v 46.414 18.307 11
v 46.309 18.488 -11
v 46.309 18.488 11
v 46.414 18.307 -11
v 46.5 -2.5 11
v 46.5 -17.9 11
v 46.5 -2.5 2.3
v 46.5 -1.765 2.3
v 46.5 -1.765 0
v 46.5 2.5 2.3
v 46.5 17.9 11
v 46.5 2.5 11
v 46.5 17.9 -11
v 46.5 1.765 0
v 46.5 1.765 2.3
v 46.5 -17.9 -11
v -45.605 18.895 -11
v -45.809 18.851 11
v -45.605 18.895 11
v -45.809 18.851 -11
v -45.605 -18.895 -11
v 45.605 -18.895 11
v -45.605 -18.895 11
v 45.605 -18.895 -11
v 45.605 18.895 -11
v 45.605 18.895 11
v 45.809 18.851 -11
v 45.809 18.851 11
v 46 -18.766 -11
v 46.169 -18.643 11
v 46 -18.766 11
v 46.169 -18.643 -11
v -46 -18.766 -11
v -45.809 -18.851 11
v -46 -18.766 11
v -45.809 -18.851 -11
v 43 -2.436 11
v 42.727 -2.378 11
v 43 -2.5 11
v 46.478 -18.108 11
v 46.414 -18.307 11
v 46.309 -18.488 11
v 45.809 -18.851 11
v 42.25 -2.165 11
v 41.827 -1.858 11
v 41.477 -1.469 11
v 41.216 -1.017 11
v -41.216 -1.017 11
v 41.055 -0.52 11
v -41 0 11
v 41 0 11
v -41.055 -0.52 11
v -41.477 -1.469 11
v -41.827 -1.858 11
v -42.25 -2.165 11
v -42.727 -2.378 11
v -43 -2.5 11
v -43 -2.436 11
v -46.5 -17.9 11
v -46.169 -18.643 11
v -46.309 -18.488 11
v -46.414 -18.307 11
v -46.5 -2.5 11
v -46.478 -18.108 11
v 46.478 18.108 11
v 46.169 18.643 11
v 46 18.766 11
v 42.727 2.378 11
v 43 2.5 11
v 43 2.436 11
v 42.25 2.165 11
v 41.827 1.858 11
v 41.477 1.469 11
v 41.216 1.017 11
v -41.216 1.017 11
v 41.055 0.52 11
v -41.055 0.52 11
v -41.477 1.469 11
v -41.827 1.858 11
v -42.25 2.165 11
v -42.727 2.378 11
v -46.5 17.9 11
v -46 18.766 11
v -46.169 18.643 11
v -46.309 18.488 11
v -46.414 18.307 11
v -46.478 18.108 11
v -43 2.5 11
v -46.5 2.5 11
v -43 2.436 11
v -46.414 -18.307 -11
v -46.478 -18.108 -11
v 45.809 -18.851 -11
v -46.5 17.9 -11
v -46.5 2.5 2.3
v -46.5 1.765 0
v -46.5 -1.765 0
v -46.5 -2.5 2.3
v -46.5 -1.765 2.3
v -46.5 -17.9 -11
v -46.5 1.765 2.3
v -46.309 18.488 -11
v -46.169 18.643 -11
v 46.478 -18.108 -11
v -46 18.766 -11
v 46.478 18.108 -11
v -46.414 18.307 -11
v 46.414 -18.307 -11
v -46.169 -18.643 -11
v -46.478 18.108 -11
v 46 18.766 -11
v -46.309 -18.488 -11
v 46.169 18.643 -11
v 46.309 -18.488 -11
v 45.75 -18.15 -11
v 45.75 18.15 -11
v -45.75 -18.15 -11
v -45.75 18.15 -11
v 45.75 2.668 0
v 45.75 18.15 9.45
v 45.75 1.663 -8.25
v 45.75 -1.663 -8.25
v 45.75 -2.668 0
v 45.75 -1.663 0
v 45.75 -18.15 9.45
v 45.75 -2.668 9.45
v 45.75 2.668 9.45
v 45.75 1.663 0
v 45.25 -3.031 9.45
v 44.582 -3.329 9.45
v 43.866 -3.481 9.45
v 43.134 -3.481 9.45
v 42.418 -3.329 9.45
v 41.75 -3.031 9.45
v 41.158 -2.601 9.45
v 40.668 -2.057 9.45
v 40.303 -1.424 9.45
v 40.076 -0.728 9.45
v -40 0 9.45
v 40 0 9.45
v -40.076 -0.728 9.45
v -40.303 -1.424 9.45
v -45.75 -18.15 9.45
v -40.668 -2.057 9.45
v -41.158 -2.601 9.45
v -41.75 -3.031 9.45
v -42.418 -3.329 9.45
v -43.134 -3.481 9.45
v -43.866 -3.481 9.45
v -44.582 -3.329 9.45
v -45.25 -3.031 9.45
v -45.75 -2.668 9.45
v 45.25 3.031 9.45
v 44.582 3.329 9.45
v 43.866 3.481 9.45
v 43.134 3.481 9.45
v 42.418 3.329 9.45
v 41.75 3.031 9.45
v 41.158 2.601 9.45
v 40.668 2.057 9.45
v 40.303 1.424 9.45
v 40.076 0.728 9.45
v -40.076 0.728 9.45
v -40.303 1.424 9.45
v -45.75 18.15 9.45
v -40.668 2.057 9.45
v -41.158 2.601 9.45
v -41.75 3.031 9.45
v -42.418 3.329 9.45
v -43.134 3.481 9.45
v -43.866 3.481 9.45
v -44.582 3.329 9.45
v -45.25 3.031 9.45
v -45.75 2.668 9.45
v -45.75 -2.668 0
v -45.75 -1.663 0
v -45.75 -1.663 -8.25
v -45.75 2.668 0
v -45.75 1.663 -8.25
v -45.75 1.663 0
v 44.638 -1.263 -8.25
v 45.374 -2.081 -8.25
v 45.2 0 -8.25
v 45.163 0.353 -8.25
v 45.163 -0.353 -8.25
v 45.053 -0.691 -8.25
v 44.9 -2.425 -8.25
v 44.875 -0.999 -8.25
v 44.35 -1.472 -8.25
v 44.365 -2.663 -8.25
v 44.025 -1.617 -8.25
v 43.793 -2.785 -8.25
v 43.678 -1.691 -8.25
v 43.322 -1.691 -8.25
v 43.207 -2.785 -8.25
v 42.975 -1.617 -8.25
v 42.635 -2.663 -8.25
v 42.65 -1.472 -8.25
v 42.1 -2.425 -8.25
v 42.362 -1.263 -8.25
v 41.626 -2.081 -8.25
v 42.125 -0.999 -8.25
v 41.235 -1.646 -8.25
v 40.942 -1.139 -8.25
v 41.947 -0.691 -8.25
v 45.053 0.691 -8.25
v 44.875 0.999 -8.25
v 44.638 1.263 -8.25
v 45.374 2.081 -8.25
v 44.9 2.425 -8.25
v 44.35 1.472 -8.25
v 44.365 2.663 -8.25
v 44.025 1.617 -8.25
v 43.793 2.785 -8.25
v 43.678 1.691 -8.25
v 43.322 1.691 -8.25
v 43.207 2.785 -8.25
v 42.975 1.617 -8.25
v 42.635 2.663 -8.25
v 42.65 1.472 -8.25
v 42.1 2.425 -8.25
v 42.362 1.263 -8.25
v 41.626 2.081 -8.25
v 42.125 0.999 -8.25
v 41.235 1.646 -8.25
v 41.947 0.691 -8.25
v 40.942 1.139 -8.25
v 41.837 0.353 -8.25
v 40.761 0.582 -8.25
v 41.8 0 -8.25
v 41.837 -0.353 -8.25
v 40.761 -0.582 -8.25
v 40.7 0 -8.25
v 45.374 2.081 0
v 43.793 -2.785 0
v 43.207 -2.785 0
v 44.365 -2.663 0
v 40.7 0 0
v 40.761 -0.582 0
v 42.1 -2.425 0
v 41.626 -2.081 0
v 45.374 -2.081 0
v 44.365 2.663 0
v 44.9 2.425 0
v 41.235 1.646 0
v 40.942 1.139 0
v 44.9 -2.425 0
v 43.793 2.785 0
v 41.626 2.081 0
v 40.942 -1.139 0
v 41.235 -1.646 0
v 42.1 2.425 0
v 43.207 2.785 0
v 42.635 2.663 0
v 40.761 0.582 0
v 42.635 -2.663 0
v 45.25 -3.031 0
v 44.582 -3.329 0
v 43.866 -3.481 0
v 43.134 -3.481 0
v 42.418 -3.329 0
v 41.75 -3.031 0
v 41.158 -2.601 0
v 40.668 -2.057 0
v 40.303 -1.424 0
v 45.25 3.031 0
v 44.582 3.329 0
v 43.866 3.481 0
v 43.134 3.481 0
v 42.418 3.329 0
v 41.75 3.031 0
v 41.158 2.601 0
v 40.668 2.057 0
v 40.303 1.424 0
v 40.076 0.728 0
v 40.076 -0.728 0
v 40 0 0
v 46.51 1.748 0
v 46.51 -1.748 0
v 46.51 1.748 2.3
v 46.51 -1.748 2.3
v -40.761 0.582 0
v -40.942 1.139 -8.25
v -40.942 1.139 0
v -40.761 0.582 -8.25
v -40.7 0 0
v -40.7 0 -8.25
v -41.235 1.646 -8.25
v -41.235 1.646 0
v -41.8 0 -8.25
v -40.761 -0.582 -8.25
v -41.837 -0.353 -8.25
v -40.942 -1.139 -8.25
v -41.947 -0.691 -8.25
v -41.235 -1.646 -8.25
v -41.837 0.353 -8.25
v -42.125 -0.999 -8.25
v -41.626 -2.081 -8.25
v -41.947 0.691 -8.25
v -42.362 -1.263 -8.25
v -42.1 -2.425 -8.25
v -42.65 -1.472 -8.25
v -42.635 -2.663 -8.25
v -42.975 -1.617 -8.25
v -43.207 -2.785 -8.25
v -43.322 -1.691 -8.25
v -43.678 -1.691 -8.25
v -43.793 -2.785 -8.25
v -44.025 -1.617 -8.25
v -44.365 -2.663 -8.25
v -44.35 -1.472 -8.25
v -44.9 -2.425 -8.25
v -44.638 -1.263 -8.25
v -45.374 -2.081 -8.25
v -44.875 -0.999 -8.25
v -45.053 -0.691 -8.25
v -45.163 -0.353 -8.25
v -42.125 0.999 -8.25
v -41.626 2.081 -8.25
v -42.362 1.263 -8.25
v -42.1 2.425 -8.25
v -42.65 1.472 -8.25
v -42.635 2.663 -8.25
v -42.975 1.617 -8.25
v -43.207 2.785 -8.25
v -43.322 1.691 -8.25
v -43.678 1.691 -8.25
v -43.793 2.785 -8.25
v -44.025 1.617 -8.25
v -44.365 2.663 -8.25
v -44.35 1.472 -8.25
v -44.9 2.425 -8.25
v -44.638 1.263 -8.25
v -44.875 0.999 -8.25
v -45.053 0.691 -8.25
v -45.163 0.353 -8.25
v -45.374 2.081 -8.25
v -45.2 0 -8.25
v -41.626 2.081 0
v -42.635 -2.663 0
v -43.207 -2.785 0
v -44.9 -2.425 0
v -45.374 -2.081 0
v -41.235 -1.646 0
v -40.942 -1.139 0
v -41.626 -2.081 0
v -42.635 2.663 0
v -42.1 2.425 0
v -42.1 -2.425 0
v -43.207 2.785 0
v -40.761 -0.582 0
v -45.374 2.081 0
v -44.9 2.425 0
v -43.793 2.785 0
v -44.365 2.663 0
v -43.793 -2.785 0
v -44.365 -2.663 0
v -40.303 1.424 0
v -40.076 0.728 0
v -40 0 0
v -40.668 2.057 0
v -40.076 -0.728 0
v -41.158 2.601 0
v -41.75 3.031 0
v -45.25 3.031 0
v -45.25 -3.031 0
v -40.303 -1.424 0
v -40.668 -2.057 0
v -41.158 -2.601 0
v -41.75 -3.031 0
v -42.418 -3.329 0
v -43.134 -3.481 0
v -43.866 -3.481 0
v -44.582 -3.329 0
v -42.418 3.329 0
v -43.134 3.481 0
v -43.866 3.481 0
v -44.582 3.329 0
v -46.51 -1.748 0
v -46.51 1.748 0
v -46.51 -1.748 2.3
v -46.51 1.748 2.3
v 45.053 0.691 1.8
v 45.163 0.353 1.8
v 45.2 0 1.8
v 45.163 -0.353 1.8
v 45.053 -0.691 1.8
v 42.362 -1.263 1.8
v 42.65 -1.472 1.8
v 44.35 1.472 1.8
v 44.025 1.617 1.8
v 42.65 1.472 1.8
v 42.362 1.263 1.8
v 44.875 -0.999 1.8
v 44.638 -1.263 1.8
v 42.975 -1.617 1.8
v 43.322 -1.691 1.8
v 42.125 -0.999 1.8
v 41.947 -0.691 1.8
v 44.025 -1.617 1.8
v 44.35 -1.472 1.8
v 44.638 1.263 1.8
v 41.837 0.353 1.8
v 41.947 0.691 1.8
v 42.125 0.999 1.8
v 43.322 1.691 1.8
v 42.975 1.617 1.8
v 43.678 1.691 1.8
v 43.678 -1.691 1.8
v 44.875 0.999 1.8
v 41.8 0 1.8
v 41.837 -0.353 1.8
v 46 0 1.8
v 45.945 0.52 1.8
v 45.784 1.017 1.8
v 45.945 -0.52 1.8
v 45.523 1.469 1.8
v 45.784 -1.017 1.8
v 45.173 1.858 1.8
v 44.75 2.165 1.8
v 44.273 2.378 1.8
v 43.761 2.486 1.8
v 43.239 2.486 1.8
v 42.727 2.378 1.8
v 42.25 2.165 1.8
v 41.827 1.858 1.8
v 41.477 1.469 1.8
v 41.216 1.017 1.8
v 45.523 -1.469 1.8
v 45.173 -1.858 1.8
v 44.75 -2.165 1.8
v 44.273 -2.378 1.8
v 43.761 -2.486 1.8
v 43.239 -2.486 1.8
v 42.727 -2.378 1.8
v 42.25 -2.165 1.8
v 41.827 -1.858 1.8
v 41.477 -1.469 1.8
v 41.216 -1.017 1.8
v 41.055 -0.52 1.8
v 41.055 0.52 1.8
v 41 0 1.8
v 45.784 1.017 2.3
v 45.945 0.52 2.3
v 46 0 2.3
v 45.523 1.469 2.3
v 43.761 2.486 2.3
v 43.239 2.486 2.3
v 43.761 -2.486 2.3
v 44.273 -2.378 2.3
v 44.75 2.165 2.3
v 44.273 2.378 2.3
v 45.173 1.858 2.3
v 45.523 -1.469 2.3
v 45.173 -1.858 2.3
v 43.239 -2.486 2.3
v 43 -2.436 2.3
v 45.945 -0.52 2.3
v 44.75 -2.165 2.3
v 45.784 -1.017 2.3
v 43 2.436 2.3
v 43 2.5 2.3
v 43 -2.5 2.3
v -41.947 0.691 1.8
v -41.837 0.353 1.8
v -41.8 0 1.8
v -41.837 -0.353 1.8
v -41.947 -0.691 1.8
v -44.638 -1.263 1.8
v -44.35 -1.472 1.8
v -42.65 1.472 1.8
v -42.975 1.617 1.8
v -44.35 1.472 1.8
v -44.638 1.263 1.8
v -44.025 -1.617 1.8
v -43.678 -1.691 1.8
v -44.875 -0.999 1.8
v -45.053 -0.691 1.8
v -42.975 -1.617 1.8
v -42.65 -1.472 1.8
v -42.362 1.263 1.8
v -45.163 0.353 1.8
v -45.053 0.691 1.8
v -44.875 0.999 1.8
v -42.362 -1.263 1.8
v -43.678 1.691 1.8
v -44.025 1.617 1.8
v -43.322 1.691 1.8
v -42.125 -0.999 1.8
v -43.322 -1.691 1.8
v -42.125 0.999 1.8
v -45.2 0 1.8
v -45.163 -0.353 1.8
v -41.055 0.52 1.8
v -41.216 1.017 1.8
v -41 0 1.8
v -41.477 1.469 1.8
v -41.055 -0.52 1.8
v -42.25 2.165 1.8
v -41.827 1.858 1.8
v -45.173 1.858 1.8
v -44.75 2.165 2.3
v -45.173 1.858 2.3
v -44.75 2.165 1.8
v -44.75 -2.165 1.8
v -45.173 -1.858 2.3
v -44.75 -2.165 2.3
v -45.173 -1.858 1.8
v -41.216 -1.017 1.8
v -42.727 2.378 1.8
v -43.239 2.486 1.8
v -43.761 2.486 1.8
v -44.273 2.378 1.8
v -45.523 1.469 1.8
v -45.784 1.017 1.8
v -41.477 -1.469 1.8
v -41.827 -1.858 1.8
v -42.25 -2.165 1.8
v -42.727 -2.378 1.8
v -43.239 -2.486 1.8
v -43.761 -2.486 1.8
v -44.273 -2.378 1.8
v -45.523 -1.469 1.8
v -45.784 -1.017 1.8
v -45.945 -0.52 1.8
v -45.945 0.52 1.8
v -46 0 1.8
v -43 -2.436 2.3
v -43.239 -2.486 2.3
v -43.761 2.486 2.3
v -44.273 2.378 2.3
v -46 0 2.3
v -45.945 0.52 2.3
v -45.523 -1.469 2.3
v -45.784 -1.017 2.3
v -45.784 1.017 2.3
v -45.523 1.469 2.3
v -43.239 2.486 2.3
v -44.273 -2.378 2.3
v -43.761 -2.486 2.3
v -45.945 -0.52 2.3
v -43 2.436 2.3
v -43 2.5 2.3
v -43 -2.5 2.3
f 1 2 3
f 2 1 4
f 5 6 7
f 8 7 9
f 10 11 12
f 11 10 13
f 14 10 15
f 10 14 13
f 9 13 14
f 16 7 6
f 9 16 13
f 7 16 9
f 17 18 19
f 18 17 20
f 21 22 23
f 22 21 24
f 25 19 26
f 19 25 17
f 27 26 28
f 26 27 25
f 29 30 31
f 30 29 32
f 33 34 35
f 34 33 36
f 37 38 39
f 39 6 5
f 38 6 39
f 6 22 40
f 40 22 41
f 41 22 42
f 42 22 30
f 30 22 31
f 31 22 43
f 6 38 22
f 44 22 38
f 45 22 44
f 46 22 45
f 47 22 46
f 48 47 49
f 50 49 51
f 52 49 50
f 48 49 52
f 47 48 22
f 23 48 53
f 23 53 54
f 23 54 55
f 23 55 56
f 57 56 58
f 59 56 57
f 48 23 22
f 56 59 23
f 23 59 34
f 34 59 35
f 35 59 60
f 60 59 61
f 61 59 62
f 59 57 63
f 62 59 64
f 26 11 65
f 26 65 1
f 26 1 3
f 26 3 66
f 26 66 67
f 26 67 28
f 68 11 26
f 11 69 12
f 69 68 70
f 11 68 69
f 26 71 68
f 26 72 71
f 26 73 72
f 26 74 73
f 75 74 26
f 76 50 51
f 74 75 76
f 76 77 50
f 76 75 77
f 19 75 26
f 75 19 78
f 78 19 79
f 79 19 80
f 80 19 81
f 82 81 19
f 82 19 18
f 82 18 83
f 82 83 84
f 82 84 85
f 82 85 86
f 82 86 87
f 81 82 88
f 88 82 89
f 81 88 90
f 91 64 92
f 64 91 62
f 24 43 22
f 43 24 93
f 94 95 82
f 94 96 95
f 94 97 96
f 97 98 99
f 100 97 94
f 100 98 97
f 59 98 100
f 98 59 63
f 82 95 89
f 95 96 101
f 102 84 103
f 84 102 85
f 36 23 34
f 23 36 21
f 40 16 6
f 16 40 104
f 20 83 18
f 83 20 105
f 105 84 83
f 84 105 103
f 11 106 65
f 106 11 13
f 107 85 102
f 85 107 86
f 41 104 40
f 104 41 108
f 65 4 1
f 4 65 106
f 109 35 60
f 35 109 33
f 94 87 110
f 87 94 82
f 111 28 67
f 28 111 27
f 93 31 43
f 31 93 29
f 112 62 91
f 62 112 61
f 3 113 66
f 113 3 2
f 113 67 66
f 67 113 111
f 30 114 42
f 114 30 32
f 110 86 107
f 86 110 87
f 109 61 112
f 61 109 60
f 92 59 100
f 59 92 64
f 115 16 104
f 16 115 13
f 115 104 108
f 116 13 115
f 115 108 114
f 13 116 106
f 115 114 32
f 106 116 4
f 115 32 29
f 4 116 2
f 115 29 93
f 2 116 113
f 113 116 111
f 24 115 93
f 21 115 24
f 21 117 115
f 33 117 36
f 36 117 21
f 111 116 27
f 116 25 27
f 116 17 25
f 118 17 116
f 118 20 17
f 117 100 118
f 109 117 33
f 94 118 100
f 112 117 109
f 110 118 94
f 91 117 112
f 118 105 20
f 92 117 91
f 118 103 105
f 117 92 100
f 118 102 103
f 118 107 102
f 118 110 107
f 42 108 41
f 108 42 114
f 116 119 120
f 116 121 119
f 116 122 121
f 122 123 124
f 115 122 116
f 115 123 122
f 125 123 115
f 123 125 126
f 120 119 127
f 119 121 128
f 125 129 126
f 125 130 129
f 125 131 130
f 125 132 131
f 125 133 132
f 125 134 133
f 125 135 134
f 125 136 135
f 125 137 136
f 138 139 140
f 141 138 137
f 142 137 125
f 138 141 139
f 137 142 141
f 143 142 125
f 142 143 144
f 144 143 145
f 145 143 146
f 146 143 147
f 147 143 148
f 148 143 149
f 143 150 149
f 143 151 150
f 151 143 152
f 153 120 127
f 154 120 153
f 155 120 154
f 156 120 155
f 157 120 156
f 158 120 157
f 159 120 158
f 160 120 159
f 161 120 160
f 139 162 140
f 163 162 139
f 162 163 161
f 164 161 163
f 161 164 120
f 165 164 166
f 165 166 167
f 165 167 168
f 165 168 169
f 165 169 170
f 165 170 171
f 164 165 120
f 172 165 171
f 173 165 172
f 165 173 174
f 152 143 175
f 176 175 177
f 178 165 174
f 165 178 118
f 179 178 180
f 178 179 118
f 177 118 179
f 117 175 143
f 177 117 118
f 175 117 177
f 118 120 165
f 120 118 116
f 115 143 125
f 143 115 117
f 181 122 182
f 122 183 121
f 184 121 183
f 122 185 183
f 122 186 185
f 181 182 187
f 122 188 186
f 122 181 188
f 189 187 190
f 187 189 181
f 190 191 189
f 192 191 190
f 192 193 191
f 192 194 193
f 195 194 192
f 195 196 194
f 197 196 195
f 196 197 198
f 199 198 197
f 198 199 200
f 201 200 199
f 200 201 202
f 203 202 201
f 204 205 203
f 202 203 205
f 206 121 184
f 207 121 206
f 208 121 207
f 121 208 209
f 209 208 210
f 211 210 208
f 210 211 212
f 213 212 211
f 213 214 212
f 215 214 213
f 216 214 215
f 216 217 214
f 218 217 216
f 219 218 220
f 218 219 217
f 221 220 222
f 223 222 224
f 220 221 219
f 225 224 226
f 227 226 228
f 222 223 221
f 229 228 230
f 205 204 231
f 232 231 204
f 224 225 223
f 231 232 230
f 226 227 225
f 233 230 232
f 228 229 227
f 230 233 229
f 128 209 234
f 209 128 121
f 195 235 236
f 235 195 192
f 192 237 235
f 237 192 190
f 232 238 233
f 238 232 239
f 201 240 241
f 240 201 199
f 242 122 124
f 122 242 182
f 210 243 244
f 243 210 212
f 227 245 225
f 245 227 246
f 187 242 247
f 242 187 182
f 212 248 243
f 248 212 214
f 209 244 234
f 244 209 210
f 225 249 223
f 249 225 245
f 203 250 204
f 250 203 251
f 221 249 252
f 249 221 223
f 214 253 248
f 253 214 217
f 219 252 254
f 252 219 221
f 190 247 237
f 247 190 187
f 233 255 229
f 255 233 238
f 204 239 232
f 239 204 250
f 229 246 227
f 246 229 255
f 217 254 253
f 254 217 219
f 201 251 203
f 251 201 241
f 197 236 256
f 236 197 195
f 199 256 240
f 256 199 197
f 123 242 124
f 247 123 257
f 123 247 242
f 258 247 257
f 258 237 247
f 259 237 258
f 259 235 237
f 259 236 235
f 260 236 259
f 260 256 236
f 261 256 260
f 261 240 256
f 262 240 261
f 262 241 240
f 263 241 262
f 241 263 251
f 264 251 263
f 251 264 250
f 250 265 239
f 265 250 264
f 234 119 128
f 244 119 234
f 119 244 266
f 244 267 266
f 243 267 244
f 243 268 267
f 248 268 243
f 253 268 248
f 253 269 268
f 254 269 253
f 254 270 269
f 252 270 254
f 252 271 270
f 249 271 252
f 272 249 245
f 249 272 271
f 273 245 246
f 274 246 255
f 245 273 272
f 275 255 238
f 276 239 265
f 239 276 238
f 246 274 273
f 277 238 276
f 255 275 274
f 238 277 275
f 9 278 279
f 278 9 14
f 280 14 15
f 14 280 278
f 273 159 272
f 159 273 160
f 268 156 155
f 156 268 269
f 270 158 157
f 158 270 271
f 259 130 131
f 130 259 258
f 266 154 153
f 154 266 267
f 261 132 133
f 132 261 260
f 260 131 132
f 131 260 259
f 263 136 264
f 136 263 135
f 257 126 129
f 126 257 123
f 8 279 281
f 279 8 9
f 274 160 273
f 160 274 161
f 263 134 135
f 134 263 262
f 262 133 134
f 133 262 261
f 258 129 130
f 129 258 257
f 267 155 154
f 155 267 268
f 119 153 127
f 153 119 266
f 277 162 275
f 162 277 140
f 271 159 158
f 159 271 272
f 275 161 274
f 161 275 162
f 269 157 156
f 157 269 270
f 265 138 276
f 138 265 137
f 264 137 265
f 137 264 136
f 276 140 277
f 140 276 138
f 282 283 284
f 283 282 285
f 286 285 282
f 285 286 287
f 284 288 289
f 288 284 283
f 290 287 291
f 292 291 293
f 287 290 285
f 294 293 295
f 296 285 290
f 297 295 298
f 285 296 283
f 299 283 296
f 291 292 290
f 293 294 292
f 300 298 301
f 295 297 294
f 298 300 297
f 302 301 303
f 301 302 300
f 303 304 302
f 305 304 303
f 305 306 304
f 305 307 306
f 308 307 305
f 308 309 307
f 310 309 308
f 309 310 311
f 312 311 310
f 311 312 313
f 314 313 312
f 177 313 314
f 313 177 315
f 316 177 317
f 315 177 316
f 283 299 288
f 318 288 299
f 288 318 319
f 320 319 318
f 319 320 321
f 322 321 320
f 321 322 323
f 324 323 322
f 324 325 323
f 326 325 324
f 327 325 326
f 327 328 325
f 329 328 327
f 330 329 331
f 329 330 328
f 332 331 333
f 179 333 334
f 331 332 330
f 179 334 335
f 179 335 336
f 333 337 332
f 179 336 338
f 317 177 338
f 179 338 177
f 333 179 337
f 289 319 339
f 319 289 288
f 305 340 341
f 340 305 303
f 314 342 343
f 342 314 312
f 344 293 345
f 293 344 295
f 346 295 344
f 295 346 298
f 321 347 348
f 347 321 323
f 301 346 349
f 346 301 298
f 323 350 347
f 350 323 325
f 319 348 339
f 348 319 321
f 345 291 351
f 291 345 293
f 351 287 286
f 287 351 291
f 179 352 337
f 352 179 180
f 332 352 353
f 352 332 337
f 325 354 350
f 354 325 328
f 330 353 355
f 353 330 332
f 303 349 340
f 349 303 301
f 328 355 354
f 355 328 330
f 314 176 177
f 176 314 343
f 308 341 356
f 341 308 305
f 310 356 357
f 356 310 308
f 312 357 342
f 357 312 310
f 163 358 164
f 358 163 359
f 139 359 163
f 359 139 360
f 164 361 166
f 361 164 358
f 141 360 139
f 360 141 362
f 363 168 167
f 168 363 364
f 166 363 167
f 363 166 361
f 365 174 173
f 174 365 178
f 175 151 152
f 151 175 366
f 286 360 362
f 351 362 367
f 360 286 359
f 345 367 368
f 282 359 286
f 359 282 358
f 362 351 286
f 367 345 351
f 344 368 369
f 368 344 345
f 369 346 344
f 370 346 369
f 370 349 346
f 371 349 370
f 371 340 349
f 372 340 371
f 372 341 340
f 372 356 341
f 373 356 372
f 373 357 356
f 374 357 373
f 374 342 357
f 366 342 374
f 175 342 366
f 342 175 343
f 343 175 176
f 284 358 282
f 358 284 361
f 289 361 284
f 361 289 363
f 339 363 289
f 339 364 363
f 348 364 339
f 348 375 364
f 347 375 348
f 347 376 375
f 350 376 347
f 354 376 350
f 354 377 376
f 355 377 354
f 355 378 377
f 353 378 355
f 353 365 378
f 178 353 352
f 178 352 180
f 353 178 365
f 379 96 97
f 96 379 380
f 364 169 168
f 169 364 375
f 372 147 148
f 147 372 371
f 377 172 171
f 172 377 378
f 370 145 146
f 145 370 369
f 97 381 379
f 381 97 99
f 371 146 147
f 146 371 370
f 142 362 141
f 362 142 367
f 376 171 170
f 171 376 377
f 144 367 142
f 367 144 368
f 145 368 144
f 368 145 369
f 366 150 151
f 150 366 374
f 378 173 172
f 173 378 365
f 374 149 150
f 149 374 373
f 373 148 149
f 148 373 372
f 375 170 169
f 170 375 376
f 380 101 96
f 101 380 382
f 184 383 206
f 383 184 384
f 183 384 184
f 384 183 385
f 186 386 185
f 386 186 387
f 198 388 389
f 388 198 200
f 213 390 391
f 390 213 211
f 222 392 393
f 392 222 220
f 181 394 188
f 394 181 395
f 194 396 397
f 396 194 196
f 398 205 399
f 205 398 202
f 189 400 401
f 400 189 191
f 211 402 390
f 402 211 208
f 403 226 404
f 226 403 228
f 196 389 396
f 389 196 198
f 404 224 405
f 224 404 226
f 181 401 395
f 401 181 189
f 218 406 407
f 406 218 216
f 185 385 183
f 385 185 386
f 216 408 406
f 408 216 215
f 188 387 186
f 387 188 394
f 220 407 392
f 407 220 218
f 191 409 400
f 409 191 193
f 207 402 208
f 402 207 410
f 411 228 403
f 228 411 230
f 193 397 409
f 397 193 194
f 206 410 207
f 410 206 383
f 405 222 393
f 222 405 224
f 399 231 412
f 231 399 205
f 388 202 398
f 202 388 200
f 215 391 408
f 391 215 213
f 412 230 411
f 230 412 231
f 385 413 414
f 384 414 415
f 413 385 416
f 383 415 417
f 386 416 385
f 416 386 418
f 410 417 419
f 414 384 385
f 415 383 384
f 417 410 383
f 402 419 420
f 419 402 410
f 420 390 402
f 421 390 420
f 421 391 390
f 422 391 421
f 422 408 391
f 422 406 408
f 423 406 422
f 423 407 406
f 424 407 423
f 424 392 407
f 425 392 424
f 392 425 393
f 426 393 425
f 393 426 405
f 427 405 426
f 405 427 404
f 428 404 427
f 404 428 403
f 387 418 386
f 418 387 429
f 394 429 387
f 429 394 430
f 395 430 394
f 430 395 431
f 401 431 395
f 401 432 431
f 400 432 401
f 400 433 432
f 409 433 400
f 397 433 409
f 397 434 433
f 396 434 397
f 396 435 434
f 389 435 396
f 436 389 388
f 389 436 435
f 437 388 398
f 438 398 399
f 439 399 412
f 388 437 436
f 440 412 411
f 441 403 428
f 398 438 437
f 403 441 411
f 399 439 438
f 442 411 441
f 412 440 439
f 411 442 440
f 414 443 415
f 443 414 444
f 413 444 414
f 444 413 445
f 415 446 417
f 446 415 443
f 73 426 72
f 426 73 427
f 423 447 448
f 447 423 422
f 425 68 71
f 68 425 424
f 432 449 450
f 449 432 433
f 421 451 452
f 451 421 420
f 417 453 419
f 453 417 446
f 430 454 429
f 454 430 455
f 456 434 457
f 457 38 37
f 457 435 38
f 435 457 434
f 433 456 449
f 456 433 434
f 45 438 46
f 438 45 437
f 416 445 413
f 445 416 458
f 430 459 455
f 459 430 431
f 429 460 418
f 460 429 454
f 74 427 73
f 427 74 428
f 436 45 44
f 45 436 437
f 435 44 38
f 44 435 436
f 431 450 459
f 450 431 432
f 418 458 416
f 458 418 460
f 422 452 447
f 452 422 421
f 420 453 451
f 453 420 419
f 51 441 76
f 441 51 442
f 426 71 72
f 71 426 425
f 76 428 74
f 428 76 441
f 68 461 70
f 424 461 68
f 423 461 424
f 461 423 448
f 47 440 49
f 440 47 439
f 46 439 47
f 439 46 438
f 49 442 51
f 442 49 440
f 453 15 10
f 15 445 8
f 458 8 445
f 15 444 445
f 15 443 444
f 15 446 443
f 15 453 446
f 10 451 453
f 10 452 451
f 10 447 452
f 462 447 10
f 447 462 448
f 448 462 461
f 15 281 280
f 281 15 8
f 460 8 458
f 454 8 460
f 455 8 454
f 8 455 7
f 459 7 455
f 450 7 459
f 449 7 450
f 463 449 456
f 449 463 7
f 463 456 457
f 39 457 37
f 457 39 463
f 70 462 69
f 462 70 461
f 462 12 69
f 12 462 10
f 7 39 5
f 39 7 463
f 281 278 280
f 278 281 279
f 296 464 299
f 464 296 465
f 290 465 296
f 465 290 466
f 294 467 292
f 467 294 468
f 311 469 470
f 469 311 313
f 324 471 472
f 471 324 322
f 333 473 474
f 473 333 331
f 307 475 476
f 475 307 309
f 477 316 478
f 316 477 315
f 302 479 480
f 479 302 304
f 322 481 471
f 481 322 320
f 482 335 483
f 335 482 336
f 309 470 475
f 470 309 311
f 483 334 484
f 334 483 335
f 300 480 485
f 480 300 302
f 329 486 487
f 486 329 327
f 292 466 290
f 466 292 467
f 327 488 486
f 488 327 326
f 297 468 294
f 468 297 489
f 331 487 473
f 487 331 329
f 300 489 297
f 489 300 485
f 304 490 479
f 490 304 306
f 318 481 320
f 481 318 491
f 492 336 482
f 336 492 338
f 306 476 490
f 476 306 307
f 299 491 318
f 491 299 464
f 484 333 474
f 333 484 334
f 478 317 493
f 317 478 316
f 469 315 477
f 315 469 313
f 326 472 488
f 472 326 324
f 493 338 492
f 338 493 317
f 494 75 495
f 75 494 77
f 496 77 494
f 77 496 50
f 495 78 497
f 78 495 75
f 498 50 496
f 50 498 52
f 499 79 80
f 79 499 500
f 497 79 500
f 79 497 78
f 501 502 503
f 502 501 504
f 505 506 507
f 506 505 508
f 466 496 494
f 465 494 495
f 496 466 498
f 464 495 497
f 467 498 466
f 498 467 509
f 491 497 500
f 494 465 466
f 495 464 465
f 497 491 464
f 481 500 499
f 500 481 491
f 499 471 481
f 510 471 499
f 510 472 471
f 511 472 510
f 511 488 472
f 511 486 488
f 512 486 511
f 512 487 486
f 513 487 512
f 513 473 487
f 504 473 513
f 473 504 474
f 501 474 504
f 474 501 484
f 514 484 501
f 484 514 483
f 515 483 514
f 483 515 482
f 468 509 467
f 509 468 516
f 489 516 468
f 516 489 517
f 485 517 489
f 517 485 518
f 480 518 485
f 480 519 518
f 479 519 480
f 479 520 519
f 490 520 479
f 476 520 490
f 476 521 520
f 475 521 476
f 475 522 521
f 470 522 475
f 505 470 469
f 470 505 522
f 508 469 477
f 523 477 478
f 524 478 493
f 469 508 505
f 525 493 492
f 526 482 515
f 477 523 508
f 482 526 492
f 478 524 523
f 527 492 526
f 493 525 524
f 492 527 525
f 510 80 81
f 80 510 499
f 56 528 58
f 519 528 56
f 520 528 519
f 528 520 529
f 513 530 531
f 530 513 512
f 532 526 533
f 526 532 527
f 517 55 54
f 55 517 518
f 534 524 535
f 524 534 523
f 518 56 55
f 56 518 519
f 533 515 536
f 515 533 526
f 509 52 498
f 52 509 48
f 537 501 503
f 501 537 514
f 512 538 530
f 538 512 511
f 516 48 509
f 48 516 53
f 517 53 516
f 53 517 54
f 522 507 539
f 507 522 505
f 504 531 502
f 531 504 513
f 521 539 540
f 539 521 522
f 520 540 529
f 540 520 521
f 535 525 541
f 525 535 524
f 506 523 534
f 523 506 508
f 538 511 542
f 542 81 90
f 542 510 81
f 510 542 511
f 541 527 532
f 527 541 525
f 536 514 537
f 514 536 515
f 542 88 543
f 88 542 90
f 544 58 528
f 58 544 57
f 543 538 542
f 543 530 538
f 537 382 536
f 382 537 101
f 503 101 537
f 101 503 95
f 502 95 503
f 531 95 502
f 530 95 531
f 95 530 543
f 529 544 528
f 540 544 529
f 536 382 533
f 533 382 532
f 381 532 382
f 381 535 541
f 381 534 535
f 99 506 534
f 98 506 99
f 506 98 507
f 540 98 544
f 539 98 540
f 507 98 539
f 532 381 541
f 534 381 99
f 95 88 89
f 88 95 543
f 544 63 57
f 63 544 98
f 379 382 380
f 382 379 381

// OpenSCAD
// Higher definition curves
$fs = 0.01;

// module for round
module roundedcube(size = [1, 1, 1], center = false, radius = 0.5, apply_to = "all") {
	// If single value, convert to [x, y, z] vector
	size = (size[0] == undef) ? [size, size, size] : size;

	translate_min = radius;
	translate_xmax = size[0] - radius;
	translate_ymax = size[1] - radius;
	translate_zmax = size[2] - radius;

	diameter = radius * 2;

	module build_point(type = "sphere", rotate = [0, 0, 0]) {
		if (type == "sphere") {
			sphere(r = radius);
		} else if (type == "cylinder") {
			rotate(a = rotate)
			cylinder(h = diameter, r = radius, center = true);
		}
	}

	obj_translate = (center == false) ?
		[0, 0, 0] : [
			-(size[0] / 2),
			-(size[1] / 2),
			-(size[2] / 2)
		];

	translate(v = obj_translate) {
		hull() {
			for (translate_x = [translate_min, translate_xmax]) {
				x_at = (translate_x == translate_min) ? "min" : "max";
				for (translate_y = [translate_min, translate_ymax]) {
					y_at = (translate_y == translate_min) ? "min" : "max";
					for (translate_z = [translate_min, translate_zmax]) {
						z_at = (translate_z == translate_min) ? "min" : "max";

						translate(v = [translate_x, translate_y, translate_z])
						if (
							(apply_to == "all") ||
							(apply_to == "xmin" && x_at == "min") || (apply_to == "xmax" && x_at == "max") ||
							(apply_to == "ymin" && y_at == "min") || (apply_to == "ymax" && y_at == "max") ||
							(apply_to == "zmin" && z_at == "min") || (apply_to == "zmax" && z_at == "max")
						) {
							build_point("sphere");
						} else {
							rotate = 
								(apply_to == "xmin" || apply_to == "xmax" || apply_to == "x") ? [0, 90, 0] : (
								(apply_to == "ymin" || apply_to == "ymax" || apply_to == "y") ? [90, 90, 0] :
								[0, 0, 0]
							);
							build_point("cylinder", rotate);
						}
					}
				}
			}
		}
	}
}


////////////////////////////////////////////////////////////////
////////////////////////////////////////////////////////////////
length_ext=93.0;    // length of the pickup
width_ext=37.8;     // width
height_exterior=22; // height    
holes_offset=3.0;   // center of screw holes offset from left right margin
walls_width_mm=1.5;  // walls width
length_interior=length_ext-walls_width_mm; // the interior length
width_interior=width_ext-walls_width_mm;   // the interior width

screw_bord_small_h=16.5;


screw_xoffset_x=(length_ext/2)-holes_offset;
deccub=screw_xoffset_x+6;
clip_cube_hole_x=(length_ext/2)+7.51;//51.85;
sml_ext_r=2.8;


int_hl=1.7;
cuhole=5.0;
sbh=10.0;
base_radius=3.5;

difference(){

    union()
    {
        difference() {
            
            roundedcube([length_ext,width_ext,height_exterior], true, 1.0,"xy");
            translate([0,0,-6]){
                cube([length_interior,width_interior,30.9], center=true );
            }
        }

        union(){
            union(){
                translate([screw_xoffset_x,0,0]){
                    cylinder(screw_bord_small_h,sml_ext_r,sml_ext_r,center=true);
                }
                // big solid cyl
                translate([screw_xoffset_x,0,5]){
                    cylinder(sbh,base_radius,base_radius,center=true);
                }
            }
        }

        union(){
            union(){
                translate([-screw_xoffset_x,0,0]){
                    cylinder(screw_bord_small_h,sml_ext_r,sml_ext_r,center=true);
                }
                // big solid cyl
                translate([-screw_xoffset_x,0,5]){
                    cylinder(sbh,base_radius,base_radius,center=true);
                }
            }
        }
        /*
       translate([30,-6,-8]){
            cube([13,1.0,18]);
       }
       translate([30,-18,-8]){
            cube([1,12.0,18]);
       }
        */
    }
    
    union(){
    

        
        cube_open=8.5;
        rad_up=26;
        
        union(){
            translate([screw_xoffset_x,0,0]){
                cylinder(rad_up,int_hl,int_hl,center=true);
            }
            // cut big
            translate([screw_xoffset_x,0,9.8]){
                cylinder(16,base_radius-1,base_radius-1,center=true);
            }
            
            translate([deccub,0,9.8]){
                cube([13, cuhole, 15],center=true);
            }

            translate([clip_cube_hole_x,0,9.8]){
                cube([15,cube_open,45],center=true);
            }
        }

        union(){
            translate([-screw_xoffset_x,0,0]){
                cylinder(rad_up,int_hl,int_hl,center=true);
            }
            translate([-screw_xoffset_x,0,9.8]){
                cylinder(16,base_radius-1,base_radius-1,center=true);
            }
            
            translate([-deccub,0,9.8]){
                cube([13,cuhole,15],center=true);
            }

            translate([-clip_cube_hole_x,0,9.8]){
                cube([15,cube_open,45],center=true);
            }

        }
    }
    /*
    CW=1.2;
    YTR=10.3;
    CH=1.5;
    TRP=35;
    union(){
        translate([TRP,-15,YTR]){
            rotate([45,0,0]){   
                cube([8,CH,CW], center=true);
            }
            
        }
        translate([TRP,-12,YTR]){
            rotate([45,0,0]){   
                cube([5,CH,CW], center=true);
            }
            
        }
        translate([TRP,-9,YTR]){
           rotate([45,0,0]){
                cube([8,CH,CW], center=true);
                }
        }
  
    }
    */
}
